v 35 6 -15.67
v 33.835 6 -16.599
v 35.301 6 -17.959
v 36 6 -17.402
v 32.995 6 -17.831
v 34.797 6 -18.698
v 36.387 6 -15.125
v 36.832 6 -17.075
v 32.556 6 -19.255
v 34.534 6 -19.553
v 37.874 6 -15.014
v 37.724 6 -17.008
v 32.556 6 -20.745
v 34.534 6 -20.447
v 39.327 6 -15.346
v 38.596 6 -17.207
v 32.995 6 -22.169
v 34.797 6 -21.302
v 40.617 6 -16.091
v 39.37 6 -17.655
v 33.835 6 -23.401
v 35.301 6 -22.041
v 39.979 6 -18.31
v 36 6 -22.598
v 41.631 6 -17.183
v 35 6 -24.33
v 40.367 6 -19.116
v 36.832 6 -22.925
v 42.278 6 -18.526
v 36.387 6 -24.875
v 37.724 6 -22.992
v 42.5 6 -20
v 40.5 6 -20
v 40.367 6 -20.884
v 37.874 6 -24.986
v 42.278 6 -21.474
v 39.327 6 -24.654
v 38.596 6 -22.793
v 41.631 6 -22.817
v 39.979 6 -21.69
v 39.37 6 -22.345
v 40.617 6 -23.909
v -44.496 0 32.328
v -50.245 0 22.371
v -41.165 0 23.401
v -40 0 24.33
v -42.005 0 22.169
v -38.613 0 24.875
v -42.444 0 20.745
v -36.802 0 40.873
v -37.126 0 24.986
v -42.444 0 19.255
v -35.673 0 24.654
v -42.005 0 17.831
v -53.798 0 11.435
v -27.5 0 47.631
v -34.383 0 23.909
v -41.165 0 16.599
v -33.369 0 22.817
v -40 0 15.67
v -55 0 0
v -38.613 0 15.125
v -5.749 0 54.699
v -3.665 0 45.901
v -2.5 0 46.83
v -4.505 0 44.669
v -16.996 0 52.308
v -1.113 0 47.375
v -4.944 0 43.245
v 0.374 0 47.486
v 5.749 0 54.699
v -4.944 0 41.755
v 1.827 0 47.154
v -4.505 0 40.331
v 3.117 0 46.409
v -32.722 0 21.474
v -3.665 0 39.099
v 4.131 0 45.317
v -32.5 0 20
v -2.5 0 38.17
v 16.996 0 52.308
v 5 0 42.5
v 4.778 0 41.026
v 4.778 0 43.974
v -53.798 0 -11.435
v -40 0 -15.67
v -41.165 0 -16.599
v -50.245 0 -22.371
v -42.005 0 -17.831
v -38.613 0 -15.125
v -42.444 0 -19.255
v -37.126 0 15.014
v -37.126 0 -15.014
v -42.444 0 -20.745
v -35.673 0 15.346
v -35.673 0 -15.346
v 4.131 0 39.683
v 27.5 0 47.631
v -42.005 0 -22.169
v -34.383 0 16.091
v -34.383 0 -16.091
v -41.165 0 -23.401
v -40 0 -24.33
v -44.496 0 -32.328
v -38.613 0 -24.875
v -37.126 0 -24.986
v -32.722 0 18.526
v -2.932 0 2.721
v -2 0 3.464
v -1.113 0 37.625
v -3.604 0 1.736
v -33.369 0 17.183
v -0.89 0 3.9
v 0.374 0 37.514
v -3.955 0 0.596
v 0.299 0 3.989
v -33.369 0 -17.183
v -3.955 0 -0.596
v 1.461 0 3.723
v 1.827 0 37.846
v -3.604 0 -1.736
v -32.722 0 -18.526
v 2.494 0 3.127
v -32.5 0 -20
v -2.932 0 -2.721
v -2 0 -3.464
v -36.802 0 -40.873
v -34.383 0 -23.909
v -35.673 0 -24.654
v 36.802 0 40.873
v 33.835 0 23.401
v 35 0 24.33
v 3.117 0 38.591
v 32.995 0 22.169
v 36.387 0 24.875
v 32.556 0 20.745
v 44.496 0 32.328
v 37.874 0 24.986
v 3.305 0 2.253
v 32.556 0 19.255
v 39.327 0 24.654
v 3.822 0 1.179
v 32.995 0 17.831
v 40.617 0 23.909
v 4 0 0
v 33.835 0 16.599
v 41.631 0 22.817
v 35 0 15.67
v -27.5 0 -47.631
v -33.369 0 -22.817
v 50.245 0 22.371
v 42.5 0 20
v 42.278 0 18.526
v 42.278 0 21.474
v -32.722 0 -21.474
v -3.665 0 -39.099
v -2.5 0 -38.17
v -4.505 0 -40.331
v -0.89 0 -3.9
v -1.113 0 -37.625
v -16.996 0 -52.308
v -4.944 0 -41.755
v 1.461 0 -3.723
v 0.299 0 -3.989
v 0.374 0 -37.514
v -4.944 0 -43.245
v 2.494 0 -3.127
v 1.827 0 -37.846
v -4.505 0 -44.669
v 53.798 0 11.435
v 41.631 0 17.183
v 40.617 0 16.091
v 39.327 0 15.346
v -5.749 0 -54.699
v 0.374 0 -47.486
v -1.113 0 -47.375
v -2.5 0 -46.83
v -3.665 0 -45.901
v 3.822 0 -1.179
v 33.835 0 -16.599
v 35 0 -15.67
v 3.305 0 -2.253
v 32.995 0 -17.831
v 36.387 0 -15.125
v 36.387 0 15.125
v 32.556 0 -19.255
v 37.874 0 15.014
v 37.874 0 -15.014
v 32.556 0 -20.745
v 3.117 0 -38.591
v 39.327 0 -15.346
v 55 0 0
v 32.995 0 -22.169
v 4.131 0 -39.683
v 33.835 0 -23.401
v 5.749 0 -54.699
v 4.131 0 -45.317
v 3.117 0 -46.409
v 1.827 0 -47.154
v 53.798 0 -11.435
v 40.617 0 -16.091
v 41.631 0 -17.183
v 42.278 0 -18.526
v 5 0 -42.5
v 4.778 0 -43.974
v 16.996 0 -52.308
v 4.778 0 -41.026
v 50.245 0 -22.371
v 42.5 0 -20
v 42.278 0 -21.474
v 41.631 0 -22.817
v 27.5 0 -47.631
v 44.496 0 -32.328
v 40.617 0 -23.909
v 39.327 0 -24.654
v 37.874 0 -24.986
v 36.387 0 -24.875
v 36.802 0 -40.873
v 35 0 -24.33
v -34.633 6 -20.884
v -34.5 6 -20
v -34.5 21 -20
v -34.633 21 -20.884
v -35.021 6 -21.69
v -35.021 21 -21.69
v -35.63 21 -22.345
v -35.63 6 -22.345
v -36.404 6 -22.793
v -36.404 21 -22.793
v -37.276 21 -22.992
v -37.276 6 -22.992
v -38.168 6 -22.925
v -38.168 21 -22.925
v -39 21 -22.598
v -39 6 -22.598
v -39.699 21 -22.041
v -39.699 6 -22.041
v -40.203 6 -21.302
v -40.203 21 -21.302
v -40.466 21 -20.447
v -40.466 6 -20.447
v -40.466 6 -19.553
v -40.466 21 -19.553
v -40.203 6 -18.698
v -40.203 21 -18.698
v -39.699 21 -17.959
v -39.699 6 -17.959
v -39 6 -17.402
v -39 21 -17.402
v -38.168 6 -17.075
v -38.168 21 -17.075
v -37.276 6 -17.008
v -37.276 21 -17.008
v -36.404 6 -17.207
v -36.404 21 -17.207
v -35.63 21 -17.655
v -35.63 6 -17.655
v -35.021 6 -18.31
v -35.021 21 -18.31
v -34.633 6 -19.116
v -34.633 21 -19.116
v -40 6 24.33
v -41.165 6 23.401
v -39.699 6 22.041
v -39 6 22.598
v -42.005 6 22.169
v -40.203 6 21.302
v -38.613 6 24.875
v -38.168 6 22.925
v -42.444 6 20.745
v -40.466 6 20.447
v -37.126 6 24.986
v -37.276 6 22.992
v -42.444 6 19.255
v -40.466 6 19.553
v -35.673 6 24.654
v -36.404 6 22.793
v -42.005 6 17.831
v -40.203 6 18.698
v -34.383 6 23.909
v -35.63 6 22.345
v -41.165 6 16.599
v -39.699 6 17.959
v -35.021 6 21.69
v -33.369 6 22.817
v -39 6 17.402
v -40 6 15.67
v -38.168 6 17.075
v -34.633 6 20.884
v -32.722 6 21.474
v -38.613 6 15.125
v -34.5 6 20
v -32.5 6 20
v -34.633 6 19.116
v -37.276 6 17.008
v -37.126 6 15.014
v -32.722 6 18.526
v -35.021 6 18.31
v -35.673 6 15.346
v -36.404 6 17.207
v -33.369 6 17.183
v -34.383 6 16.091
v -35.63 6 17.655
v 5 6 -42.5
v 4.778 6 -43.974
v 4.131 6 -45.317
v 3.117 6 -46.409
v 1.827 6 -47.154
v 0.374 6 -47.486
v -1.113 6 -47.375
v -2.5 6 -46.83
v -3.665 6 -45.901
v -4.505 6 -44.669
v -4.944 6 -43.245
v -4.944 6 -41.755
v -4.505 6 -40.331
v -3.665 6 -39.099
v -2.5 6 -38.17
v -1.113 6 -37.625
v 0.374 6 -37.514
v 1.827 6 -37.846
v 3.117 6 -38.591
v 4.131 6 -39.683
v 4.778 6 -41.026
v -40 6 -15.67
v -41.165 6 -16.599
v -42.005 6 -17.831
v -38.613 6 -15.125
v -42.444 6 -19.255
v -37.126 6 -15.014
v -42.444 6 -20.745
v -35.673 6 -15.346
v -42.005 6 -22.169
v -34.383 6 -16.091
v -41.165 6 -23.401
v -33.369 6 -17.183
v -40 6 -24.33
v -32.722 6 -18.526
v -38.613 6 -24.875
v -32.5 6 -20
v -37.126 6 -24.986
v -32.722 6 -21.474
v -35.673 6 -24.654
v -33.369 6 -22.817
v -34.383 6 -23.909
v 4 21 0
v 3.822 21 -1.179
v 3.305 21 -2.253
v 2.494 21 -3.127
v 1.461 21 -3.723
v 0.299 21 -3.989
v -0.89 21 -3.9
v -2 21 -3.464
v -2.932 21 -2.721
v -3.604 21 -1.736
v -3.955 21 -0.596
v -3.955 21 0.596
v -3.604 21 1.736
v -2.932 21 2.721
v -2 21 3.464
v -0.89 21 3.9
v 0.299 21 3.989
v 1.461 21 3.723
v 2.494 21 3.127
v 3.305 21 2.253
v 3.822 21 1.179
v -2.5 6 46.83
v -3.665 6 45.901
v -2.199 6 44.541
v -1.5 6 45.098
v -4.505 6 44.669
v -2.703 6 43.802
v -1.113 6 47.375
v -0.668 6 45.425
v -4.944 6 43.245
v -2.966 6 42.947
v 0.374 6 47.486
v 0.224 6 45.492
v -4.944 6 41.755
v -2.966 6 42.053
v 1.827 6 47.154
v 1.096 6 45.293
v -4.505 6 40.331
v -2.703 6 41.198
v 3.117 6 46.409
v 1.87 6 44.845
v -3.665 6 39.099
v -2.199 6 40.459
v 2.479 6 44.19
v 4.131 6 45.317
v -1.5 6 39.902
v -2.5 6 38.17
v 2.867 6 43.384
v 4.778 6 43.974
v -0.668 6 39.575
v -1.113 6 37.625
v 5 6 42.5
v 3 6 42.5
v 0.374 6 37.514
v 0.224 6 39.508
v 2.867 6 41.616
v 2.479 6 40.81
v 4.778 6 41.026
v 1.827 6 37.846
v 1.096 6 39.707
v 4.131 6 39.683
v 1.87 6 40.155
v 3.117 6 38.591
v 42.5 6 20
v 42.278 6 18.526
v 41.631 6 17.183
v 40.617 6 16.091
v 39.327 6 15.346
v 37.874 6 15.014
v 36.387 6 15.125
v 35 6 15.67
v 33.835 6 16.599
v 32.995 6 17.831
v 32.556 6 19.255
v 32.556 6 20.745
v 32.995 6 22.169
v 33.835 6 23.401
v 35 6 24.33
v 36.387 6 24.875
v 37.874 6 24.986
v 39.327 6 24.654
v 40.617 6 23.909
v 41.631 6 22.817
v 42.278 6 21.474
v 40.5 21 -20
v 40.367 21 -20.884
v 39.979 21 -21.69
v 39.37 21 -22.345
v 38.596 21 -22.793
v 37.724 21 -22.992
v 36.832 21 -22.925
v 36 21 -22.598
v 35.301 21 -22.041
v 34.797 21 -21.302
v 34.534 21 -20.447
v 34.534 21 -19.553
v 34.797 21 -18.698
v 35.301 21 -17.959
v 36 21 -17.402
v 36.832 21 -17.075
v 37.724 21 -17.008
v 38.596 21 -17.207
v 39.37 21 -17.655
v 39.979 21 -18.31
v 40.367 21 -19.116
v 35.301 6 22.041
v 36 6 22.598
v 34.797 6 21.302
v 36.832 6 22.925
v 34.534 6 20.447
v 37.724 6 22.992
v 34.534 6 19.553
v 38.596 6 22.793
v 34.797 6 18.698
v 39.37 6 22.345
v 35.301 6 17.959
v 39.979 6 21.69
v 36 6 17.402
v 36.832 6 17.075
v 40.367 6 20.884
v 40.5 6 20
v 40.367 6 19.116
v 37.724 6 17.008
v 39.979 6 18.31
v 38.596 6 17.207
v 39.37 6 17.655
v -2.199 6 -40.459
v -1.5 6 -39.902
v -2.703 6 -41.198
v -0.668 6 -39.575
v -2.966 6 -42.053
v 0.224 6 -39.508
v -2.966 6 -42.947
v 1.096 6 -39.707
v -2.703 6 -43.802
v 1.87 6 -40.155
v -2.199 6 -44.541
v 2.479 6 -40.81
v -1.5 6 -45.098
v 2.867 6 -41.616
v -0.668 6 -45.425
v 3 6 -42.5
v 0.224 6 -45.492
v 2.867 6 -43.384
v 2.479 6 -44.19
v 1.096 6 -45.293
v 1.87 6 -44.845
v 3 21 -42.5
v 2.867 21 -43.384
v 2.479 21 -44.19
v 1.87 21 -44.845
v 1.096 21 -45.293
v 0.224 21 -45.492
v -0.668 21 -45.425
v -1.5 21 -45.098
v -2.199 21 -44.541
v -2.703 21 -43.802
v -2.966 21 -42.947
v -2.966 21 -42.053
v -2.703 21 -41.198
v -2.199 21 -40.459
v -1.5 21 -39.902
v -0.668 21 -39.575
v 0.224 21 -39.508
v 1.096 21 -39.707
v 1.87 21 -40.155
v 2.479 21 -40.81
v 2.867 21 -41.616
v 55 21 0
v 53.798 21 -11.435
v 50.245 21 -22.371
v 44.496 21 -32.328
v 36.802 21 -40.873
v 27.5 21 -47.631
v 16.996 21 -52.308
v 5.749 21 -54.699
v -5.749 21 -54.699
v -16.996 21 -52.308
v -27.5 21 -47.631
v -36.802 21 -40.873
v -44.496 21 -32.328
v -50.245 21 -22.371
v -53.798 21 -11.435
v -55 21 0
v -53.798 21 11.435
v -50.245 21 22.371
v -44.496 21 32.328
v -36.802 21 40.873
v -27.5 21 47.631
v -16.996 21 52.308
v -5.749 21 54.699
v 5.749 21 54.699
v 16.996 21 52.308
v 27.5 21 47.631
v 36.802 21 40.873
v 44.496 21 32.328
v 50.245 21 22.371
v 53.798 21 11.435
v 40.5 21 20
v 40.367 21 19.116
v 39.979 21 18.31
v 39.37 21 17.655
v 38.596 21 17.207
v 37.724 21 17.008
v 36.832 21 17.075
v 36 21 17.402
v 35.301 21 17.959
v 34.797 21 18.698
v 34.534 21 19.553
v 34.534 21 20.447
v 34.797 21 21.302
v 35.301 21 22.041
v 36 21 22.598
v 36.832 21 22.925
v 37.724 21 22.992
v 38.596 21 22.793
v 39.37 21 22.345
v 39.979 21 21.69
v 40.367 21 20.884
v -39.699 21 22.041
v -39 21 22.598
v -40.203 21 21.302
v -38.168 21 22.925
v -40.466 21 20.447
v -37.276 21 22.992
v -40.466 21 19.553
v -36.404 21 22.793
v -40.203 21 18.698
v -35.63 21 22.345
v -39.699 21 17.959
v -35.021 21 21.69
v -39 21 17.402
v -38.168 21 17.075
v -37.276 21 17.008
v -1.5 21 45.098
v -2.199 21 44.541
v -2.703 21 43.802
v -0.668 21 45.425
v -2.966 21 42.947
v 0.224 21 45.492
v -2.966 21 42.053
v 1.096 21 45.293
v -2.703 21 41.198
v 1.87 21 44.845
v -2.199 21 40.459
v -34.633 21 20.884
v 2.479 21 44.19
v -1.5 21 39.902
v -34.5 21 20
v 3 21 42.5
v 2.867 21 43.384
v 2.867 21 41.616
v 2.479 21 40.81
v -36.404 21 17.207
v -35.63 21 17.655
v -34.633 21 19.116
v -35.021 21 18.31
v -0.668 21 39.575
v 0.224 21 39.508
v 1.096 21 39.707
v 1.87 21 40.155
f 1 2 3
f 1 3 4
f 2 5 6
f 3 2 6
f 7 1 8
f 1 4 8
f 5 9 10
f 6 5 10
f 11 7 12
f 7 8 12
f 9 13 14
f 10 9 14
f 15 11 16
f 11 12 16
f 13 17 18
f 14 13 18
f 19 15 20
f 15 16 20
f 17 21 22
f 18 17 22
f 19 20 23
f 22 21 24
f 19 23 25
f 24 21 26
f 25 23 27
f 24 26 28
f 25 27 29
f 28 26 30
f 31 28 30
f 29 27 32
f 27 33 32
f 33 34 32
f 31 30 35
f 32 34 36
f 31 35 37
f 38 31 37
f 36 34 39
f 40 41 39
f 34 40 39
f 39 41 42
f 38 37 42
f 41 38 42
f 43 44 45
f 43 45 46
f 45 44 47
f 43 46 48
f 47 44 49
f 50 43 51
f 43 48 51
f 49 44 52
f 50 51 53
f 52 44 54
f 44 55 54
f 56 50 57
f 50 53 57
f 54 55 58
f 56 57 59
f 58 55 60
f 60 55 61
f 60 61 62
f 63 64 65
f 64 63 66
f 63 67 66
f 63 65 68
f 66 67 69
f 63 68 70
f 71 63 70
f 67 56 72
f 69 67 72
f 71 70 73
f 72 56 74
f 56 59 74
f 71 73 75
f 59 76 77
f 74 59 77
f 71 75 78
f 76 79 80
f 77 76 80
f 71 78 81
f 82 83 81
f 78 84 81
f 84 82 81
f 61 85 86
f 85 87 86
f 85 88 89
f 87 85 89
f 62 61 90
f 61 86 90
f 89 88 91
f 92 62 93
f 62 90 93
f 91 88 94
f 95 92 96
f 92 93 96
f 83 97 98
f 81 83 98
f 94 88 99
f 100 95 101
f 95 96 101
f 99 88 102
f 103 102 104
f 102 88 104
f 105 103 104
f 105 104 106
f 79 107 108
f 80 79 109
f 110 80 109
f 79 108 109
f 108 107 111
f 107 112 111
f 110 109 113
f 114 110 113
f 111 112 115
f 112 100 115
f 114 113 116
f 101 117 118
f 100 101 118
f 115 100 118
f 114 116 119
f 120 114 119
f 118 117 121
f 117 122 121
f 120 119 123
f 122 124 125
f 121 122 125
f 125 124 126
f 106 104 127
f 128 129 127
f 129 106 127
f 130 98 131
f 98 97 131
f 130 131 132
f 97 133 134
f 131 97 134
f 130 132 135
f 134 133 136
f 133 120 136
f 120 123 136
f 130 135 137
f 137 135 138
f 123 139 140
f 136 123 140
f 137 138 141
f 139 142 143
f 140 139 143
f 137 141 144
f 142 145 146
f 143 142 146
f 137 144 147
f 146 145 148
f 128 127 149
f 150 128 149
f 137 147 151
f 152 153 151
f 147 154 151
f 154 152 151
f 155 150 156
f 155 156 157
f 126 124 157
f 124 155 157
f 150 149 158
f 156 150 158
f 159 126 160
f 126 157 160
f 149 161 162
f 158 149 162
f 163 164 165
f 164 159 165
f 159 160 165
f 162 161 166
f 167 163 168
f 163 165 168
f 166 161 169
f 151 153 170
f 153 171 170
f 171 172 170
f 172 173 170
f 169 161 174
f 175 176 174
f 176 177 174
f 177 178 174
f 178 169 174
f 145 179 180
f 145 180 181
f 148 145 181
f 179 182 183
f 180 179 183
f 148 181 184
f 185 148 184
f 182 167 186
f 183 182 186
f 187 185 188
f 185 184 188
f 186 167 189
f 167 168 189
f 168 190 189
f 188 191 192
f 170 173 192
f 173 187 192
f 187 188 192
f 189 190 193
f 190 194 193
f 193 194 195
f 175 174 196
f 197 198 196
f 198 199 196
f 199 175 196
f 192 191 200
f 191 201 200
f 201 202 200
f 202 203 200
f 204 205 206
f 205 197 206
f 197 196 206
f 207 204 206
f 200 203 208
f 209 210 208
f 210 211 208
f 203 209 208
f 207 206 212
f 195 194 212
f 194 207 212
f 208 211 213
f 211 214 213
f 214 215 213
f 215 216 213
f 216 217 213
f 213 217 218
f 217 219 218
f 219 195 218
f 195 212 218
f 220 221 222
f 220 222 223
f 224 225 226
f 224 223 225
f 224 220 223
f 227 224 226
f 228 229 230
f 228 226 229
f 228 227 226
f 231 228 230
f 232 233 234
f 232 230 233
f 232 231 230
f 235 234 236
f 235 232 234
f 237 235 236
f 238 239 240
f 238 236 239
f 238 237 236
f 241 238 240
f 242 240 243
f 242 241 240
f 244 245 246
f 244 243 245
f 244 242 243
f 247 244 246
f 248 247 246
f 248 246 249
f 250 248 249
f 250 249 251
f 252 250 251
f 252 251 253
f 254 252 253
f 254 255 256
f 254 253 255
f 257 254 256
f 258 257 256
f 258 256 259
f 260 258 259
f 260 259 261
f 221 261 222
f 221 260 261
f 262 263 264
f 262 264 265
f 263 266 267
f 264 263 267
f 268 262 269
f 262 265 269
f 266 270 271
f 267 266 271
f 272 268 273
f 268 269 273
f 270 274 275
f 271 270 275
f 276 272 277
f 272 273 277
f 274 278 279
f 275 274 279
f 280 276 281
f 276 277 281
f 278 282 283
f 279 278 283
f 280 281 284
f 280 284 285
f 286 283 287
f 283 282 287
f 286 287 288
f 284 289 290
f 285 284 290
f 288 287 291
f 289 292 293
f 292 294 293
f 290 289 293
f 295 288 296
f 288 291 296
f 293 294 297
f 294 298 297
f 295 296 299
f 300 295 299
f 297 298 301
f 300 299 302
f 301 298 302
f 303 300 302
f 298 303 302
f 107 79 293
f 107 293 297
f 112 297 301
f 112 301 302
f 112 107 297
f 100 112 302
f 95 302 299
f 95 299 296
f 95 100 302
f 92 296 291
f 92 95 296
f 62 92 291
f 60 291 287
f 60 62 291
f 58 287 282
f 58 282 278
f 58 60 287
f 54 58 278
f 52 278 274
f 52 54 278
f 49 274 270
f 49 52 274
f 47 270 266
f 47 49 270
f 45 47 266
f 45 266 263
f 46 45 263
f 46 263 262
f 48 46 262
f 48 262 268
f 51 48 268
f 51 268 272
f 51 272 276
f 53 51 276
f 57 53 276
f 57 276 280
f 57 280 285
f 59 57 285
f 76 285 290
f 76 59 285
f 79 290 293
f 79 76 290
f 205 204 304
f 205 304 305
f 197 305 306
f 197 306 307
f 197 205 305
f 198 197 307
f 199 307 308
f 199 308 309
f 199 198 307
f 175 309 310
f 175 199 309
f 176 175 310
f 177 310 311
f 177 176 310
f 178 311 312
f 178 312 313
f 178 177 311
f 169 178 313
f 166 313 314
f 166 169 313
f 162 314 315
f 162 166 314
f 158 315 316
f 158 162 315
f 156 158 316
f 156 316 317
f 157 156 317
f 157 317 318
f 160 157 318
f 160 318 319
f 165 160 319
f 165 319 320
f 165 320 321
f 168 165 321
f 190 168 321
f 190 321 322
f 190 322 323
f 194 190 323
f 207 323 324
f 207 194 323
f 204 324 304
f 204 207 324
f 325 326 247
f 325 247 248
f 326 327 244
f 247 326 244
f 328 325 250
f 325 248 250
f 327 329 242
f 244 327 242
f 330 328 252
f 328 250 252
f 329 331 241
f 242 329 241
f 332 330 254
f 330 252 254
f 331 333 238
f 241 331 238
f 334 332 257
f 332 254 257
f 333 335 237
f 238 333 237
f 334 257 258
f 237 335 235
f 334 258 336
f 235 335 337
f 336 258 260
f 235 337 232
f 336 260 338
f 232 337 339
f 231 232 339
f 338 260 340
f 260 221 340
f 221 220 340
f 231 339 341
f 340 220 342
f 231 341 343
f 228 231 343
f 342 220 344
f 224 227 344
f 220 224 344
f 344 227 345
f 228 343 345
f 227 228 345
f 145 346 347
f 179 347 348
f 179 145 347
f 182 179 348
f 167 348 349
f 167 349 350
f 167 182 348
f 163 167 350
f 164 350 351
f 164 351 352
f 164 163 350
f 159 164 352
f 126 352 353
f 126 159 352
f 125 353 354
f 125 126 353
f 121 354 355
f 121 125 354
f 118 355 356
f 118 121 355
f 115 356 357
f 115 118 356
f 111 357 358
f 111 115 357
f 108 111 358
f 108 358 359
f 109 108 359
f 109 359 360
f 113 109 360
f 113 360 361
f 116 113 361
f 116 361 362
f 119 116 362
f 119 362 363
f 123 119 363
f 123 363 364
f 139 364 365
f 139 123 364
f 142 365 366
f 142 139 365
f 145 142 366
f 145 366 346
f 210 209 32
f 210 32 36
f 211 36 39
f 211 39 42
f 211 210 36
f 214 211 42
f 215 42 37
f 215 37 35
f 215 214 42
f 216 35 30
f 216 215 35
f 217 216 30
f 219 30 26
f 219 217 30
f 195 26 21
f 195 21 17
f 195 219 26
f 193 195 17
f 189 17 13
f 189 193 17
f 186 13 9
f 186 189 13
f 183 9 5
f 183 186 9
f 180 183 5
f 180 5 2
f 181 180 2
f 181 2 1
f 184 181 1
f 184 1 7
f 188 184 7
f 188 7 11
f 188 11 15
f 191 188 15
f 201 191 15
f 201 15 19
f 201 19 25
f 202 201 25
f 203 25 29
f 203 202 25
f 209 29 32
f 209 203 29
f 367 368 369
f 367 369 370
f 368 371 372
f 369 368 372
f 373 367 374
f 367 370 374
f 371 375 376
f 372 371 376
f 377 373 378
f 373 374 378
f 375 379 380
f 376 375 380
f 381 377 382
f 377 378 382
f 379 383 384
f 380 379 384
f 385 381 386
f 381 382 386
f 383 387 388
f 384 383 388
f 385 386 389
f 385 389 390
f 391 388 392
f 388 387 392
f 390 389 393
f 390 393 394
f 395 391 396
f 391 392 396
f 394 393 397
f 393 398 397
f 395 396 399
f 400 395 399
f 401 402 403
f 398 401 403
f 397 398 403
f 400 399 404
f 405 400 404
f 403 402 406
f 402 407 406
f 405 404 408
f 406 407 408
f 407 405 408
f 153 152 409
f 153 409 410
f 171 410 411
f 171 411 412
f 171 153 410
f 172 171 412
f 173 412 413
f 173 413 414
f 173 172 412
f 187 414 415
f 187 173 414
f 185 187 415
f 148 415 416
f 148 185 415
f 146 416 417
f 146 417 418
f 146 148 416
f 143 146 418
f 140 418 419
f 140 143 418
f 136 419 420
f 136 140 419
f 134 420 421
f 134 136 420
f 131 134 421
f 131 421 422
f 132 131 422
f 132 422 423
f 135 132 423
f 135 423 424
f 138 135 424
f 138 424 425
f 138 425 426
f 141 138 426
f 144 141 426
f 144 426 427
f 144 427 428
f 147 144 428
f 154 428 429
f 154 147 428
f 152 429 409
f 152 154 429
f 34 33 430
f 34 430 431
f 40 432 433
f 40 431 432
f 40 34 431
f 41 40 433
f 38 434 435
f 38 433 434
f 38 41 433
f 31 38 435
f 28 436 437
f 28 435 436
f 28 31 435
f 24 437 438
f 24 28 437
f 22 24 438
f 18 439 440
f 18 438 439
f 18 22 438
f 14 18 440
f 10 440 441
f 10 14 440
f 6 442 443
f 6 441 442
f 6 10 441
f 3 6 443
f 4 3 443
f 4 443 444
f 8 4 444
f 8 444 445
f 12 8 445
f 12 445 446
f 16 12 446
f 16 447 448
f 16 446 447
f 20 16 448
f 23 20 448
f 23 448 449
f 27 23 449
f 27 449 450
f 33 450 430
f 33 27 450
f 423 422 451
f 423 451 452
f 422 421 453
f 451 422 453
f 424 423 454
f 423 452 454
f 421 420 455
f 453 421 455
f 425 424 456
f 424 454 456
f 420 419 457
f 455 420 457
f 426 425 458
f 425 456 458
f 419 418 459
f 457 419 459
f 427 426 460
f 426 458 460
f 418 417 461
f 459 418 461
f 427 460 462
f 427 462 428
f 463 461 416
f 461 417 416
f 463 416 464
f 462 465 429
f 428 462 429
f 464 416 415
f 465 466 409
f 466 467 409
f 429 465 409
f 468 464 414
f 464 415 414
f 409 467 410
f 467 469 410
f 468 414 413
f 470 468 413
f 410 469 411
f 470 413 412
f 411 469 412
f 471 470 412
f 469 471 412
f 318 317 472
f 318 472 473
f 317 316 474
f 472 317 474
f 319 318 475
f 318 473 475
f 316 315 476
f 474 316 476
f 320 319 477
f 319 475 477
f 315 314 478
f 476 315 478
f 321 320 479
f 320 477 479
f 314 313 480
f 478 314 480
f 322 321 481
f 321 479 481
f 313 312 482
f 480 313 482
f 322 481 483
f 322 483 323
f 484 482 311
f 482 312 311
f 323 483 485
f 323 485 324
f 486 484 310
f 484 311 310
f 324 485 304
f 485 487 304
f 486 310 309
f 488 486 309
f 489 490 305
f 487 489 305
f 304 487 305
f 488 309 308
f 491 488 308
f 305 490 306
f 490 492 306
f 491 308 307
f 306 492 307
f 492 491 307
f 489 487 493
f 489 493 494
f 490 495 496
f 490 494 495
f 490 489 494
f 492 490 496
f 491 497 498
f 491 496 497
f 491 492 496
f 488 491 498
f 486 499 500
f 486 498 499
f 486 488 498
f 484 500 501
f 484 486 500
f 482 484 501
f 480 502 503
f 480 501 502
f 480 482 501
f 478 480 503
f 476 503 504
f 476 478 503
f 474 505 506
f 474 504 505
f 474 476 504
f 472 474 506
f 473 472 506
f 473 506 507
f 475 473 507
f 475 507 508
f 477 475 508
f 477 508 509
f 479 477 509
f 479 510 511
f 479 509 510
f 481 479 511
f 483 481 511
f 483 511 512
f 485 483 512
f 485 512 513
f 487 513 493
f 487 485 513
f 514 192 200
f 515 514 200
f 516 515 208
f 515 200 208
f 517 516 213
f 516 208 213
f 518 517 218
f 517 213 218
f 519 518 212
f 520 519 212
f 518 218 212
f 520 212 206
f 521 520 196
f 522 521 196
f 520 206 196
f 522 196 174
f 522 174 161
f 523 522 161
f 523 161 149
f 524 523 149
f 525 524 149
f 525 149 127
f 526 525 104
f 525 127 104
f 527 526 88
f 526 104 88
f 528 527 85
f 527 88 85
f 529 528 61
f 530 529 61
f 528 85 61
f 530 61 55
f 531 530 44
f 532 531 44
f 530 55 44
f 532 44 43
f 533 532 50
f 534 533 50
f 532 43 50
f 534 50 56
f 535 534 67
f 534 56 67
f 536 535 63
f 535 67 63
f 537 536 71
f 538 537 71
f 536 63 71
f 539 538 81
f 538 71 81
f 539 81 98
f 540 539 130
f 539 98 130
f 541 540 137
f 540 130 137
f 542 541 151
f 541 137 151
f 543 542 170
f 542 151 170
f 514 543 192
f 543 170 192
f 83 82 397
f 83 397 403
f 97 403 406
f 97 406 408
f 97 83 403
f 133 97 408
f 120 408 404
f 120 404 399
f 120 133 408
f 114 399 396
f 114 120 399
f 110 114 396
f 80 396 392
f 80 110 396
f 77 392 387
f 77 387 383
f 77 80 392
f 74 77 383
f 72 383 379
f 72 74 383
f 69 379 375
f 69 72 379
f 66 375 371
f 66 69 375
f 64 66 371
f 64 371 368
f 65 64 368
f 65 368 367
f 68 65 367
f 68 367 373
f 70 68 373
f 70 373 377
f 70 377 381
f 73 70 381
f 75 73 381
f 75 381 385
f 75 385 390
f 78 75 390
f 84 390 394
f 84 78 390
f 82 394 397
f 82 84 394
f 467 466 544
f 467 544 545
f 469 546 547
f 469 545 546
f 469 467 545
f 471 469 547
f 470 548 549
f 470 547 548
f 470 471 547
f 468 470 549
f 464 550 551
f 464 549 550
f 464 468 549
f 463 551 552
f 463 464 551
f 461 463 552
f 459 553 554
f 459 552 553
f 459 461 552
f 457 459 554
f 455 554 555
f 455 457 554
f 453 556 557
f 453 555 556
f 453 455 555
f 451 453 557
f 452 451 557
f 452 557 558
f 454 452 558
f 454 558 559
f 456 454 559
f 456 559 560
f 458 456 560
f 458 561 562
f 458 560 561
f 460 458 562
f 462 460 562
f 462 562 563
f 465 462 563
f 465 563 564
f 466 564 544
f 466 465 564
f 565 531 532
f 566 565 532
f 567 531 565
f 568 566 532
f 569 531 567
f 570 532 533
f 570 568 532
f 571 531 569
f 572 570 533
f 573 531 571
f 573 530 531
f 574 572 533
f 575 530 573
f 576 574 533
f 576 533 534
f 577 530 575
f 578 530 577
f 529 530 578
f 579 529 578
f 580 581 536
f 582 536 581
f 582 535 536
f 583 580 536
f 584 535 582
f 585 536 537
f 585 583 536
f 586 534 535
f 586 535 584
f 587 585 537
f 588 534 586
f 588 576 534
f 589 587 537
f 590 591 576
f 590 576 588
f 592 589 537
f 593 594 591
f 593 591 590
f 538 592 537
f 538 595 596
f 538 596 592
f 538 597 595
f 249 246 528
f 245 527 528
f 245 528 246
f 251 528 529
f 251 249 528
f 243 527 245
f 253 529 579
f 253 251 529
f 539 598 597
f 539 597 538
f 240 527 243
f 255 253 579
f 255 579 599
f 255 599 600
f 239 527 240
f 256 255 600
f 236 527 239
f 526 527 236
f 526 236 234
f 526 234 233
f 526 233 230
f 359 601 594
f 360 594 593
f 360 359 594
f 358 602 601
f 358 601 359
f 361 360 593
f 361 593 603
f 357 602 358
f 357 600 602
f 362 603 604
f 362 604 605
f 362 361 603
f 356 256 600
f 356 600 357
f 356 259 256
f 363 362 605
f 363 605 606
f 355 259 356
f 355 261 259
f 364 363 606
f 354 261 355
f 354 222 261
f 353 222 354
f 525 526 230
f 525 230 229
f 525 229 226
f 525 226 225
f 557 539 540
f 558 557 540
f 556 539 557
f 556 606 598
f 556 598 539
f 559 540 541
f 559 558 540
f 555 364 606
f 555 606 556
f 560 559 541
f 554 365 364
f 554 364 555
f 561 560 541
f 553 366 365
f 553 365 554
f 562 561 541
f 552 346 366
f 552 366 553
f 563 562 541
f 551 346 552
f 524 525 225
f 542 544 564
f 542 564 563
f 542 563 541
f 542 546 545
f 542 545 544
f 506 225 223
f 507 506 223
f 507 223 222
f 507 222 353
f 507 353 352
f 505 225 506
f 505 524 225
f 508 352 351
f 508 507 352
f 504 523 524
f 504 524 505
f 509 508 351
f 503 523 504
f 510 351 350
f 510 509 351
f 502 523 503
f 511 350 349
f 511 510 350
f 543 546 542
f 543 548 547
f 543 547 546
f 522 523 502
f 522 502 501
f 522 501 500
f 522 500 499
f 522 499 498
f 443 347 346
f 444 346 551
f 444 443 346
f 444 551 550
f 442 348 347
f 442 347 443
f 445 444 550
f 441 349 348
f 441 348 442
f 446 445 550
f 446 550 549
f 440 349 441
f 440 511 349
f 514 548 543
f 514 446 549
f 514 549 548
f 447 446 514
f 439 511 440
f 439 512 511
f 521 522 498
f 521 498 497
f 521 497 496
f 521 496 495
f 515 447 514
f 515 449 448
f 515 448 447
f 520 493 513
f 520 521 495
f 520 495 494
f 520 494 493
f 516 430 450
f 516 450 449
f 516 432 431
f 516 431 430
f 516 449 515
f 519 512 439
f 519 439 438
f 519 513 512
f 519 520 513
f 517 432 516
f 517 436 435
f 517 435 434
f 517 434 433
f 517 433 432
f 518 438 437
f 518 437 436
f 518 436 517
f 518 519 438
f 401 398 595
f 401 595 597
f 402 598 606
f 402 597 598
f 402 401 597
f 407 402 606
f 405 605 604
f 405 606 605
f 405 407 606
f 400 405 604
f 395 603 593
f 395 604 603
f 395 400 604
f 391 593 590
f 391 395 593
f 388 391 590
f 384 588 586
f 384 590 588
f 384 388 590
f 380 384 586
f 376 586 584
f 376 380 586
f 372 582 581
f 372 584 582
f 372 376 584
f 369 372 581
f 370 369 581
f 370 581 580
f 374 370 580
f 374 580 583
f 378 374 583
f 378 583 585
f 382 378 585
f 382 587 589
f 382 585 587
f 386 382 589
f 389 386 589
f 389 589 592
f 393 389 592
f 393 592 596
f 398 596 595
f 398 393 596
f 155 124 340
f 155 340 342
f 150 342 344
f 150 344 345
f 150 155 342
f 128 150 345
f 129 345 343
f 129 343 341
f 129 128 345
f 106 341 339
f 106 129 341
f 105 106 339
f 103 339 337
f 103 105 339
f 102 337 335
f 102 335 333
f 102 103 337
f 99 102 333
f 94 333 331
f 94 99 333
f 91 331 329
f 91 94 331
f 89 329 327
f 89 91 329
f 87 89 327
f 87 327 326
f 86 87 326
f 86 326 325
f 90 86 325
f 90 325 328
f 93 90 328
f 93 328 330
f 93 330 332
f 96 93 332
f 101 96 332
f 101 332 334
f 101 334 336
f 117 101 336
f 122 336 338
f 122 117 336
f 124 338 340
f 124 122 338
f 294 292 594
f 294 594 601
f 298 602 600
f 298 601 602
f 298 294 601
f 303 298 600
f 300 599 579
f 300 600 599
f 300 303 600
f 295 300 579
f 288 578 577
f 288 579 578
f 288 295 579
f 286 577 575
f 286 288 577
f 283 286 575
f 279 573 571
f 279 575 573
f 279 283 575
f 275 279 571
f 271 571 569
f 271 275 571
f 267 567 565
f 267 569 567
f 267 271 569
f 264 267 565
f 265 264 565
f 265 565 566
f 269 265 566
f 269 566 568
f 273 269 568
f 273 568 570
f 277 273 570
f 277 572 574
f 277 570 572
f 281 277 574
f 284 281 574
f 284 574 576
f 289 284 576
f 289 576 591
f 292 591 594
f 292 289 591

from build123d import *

# Parameters (mm, degrees)
SKETCH1_R               = 55
SKETCH1_R_2             = 4
BOSS_EXTRUDE1_DEPTH     = 21
SKETCH2_R               = 3
CUT_EXTRUDE3_DEPTH      = 22
CUT_EXTRUDE3_DEPTH_BACK = 10
SKETCH3_R               = 5
CUT_EXTRUDE4_DEPTH      = 6


with BuildPart() as part:
    # Sketch1 → Boss-Extrude1 (new body)
    with BuildSketch(Plane(origin=(0, 0, 0), x_dir=(1, 0, 0), z_dir=(0, 1, 0))):
        Circle(SKETCH1_R)
        Circle(SKETCH1_R_2, mode=Mode.SUBTRACT)
    extrude(amount=BOSS_EXTRUDE1_DEPTH)

    # Sketch2 → Cut-Extrude3 (cut, two sides)
    with BuildSketch(Plane(origin=(0, 0, 0), x_dir=(1, 0, 0), z_dir=(0, 1, 0))) as cut_extrude3_sk:
        with Locations((37.5, 20)):
            Circle(SKETCH2_R)
        with Locations((37.5, -20)):
            Circle(SKETCH2_R)
        with Locations((-37.5, -20)):
            Circle(SKETCH2_R)
        with Locations((-37.5, 20)):
            Circle(SKETCH2_R)
        with Locations((0, 42.5)):
            Circle(SKETCH2_R)
        with Locations((0, -42.5)):
            Circle(SKETCH2_R)
    extrude(amount=CUT_EXTRUDE3_DEPTH, mode=Mode.SUBTRACT)
    extrude(cut_extrude3_sk.sketch, amount=-CUT_EXTRUDE3_DEPTH_BACK, mode=Mode.SUBTRACT)

    # Sketch3 → Cut-Extrude4 (cut)
    with BuildSketch(Plane(origin=(0, 0, 0), x_dir=(1, 0, 0), z_dir=(0, 1, 0))):
        with Locations((-37.5, 20)):
            Circle(SKETCH3_R)
        with Locations((-37.5, -20)):
            Circle(SKETCH3_R)
        with Locations((37.5, 20)):
            Circle(SKETCH3_R)
        with Locations((37.5, -20)):
            Circle(SKETCH3_R)
        with Locations((0, 42.5)):
            Circle(SKETCH3_R)
        with Locations((0, -42.5)):
            Circle(SKETCH3_R)
    extrude(amount=CUT_EXTRUDE4_DEPTH, mode=Mode.SUBTRACT)


solid = part.part
